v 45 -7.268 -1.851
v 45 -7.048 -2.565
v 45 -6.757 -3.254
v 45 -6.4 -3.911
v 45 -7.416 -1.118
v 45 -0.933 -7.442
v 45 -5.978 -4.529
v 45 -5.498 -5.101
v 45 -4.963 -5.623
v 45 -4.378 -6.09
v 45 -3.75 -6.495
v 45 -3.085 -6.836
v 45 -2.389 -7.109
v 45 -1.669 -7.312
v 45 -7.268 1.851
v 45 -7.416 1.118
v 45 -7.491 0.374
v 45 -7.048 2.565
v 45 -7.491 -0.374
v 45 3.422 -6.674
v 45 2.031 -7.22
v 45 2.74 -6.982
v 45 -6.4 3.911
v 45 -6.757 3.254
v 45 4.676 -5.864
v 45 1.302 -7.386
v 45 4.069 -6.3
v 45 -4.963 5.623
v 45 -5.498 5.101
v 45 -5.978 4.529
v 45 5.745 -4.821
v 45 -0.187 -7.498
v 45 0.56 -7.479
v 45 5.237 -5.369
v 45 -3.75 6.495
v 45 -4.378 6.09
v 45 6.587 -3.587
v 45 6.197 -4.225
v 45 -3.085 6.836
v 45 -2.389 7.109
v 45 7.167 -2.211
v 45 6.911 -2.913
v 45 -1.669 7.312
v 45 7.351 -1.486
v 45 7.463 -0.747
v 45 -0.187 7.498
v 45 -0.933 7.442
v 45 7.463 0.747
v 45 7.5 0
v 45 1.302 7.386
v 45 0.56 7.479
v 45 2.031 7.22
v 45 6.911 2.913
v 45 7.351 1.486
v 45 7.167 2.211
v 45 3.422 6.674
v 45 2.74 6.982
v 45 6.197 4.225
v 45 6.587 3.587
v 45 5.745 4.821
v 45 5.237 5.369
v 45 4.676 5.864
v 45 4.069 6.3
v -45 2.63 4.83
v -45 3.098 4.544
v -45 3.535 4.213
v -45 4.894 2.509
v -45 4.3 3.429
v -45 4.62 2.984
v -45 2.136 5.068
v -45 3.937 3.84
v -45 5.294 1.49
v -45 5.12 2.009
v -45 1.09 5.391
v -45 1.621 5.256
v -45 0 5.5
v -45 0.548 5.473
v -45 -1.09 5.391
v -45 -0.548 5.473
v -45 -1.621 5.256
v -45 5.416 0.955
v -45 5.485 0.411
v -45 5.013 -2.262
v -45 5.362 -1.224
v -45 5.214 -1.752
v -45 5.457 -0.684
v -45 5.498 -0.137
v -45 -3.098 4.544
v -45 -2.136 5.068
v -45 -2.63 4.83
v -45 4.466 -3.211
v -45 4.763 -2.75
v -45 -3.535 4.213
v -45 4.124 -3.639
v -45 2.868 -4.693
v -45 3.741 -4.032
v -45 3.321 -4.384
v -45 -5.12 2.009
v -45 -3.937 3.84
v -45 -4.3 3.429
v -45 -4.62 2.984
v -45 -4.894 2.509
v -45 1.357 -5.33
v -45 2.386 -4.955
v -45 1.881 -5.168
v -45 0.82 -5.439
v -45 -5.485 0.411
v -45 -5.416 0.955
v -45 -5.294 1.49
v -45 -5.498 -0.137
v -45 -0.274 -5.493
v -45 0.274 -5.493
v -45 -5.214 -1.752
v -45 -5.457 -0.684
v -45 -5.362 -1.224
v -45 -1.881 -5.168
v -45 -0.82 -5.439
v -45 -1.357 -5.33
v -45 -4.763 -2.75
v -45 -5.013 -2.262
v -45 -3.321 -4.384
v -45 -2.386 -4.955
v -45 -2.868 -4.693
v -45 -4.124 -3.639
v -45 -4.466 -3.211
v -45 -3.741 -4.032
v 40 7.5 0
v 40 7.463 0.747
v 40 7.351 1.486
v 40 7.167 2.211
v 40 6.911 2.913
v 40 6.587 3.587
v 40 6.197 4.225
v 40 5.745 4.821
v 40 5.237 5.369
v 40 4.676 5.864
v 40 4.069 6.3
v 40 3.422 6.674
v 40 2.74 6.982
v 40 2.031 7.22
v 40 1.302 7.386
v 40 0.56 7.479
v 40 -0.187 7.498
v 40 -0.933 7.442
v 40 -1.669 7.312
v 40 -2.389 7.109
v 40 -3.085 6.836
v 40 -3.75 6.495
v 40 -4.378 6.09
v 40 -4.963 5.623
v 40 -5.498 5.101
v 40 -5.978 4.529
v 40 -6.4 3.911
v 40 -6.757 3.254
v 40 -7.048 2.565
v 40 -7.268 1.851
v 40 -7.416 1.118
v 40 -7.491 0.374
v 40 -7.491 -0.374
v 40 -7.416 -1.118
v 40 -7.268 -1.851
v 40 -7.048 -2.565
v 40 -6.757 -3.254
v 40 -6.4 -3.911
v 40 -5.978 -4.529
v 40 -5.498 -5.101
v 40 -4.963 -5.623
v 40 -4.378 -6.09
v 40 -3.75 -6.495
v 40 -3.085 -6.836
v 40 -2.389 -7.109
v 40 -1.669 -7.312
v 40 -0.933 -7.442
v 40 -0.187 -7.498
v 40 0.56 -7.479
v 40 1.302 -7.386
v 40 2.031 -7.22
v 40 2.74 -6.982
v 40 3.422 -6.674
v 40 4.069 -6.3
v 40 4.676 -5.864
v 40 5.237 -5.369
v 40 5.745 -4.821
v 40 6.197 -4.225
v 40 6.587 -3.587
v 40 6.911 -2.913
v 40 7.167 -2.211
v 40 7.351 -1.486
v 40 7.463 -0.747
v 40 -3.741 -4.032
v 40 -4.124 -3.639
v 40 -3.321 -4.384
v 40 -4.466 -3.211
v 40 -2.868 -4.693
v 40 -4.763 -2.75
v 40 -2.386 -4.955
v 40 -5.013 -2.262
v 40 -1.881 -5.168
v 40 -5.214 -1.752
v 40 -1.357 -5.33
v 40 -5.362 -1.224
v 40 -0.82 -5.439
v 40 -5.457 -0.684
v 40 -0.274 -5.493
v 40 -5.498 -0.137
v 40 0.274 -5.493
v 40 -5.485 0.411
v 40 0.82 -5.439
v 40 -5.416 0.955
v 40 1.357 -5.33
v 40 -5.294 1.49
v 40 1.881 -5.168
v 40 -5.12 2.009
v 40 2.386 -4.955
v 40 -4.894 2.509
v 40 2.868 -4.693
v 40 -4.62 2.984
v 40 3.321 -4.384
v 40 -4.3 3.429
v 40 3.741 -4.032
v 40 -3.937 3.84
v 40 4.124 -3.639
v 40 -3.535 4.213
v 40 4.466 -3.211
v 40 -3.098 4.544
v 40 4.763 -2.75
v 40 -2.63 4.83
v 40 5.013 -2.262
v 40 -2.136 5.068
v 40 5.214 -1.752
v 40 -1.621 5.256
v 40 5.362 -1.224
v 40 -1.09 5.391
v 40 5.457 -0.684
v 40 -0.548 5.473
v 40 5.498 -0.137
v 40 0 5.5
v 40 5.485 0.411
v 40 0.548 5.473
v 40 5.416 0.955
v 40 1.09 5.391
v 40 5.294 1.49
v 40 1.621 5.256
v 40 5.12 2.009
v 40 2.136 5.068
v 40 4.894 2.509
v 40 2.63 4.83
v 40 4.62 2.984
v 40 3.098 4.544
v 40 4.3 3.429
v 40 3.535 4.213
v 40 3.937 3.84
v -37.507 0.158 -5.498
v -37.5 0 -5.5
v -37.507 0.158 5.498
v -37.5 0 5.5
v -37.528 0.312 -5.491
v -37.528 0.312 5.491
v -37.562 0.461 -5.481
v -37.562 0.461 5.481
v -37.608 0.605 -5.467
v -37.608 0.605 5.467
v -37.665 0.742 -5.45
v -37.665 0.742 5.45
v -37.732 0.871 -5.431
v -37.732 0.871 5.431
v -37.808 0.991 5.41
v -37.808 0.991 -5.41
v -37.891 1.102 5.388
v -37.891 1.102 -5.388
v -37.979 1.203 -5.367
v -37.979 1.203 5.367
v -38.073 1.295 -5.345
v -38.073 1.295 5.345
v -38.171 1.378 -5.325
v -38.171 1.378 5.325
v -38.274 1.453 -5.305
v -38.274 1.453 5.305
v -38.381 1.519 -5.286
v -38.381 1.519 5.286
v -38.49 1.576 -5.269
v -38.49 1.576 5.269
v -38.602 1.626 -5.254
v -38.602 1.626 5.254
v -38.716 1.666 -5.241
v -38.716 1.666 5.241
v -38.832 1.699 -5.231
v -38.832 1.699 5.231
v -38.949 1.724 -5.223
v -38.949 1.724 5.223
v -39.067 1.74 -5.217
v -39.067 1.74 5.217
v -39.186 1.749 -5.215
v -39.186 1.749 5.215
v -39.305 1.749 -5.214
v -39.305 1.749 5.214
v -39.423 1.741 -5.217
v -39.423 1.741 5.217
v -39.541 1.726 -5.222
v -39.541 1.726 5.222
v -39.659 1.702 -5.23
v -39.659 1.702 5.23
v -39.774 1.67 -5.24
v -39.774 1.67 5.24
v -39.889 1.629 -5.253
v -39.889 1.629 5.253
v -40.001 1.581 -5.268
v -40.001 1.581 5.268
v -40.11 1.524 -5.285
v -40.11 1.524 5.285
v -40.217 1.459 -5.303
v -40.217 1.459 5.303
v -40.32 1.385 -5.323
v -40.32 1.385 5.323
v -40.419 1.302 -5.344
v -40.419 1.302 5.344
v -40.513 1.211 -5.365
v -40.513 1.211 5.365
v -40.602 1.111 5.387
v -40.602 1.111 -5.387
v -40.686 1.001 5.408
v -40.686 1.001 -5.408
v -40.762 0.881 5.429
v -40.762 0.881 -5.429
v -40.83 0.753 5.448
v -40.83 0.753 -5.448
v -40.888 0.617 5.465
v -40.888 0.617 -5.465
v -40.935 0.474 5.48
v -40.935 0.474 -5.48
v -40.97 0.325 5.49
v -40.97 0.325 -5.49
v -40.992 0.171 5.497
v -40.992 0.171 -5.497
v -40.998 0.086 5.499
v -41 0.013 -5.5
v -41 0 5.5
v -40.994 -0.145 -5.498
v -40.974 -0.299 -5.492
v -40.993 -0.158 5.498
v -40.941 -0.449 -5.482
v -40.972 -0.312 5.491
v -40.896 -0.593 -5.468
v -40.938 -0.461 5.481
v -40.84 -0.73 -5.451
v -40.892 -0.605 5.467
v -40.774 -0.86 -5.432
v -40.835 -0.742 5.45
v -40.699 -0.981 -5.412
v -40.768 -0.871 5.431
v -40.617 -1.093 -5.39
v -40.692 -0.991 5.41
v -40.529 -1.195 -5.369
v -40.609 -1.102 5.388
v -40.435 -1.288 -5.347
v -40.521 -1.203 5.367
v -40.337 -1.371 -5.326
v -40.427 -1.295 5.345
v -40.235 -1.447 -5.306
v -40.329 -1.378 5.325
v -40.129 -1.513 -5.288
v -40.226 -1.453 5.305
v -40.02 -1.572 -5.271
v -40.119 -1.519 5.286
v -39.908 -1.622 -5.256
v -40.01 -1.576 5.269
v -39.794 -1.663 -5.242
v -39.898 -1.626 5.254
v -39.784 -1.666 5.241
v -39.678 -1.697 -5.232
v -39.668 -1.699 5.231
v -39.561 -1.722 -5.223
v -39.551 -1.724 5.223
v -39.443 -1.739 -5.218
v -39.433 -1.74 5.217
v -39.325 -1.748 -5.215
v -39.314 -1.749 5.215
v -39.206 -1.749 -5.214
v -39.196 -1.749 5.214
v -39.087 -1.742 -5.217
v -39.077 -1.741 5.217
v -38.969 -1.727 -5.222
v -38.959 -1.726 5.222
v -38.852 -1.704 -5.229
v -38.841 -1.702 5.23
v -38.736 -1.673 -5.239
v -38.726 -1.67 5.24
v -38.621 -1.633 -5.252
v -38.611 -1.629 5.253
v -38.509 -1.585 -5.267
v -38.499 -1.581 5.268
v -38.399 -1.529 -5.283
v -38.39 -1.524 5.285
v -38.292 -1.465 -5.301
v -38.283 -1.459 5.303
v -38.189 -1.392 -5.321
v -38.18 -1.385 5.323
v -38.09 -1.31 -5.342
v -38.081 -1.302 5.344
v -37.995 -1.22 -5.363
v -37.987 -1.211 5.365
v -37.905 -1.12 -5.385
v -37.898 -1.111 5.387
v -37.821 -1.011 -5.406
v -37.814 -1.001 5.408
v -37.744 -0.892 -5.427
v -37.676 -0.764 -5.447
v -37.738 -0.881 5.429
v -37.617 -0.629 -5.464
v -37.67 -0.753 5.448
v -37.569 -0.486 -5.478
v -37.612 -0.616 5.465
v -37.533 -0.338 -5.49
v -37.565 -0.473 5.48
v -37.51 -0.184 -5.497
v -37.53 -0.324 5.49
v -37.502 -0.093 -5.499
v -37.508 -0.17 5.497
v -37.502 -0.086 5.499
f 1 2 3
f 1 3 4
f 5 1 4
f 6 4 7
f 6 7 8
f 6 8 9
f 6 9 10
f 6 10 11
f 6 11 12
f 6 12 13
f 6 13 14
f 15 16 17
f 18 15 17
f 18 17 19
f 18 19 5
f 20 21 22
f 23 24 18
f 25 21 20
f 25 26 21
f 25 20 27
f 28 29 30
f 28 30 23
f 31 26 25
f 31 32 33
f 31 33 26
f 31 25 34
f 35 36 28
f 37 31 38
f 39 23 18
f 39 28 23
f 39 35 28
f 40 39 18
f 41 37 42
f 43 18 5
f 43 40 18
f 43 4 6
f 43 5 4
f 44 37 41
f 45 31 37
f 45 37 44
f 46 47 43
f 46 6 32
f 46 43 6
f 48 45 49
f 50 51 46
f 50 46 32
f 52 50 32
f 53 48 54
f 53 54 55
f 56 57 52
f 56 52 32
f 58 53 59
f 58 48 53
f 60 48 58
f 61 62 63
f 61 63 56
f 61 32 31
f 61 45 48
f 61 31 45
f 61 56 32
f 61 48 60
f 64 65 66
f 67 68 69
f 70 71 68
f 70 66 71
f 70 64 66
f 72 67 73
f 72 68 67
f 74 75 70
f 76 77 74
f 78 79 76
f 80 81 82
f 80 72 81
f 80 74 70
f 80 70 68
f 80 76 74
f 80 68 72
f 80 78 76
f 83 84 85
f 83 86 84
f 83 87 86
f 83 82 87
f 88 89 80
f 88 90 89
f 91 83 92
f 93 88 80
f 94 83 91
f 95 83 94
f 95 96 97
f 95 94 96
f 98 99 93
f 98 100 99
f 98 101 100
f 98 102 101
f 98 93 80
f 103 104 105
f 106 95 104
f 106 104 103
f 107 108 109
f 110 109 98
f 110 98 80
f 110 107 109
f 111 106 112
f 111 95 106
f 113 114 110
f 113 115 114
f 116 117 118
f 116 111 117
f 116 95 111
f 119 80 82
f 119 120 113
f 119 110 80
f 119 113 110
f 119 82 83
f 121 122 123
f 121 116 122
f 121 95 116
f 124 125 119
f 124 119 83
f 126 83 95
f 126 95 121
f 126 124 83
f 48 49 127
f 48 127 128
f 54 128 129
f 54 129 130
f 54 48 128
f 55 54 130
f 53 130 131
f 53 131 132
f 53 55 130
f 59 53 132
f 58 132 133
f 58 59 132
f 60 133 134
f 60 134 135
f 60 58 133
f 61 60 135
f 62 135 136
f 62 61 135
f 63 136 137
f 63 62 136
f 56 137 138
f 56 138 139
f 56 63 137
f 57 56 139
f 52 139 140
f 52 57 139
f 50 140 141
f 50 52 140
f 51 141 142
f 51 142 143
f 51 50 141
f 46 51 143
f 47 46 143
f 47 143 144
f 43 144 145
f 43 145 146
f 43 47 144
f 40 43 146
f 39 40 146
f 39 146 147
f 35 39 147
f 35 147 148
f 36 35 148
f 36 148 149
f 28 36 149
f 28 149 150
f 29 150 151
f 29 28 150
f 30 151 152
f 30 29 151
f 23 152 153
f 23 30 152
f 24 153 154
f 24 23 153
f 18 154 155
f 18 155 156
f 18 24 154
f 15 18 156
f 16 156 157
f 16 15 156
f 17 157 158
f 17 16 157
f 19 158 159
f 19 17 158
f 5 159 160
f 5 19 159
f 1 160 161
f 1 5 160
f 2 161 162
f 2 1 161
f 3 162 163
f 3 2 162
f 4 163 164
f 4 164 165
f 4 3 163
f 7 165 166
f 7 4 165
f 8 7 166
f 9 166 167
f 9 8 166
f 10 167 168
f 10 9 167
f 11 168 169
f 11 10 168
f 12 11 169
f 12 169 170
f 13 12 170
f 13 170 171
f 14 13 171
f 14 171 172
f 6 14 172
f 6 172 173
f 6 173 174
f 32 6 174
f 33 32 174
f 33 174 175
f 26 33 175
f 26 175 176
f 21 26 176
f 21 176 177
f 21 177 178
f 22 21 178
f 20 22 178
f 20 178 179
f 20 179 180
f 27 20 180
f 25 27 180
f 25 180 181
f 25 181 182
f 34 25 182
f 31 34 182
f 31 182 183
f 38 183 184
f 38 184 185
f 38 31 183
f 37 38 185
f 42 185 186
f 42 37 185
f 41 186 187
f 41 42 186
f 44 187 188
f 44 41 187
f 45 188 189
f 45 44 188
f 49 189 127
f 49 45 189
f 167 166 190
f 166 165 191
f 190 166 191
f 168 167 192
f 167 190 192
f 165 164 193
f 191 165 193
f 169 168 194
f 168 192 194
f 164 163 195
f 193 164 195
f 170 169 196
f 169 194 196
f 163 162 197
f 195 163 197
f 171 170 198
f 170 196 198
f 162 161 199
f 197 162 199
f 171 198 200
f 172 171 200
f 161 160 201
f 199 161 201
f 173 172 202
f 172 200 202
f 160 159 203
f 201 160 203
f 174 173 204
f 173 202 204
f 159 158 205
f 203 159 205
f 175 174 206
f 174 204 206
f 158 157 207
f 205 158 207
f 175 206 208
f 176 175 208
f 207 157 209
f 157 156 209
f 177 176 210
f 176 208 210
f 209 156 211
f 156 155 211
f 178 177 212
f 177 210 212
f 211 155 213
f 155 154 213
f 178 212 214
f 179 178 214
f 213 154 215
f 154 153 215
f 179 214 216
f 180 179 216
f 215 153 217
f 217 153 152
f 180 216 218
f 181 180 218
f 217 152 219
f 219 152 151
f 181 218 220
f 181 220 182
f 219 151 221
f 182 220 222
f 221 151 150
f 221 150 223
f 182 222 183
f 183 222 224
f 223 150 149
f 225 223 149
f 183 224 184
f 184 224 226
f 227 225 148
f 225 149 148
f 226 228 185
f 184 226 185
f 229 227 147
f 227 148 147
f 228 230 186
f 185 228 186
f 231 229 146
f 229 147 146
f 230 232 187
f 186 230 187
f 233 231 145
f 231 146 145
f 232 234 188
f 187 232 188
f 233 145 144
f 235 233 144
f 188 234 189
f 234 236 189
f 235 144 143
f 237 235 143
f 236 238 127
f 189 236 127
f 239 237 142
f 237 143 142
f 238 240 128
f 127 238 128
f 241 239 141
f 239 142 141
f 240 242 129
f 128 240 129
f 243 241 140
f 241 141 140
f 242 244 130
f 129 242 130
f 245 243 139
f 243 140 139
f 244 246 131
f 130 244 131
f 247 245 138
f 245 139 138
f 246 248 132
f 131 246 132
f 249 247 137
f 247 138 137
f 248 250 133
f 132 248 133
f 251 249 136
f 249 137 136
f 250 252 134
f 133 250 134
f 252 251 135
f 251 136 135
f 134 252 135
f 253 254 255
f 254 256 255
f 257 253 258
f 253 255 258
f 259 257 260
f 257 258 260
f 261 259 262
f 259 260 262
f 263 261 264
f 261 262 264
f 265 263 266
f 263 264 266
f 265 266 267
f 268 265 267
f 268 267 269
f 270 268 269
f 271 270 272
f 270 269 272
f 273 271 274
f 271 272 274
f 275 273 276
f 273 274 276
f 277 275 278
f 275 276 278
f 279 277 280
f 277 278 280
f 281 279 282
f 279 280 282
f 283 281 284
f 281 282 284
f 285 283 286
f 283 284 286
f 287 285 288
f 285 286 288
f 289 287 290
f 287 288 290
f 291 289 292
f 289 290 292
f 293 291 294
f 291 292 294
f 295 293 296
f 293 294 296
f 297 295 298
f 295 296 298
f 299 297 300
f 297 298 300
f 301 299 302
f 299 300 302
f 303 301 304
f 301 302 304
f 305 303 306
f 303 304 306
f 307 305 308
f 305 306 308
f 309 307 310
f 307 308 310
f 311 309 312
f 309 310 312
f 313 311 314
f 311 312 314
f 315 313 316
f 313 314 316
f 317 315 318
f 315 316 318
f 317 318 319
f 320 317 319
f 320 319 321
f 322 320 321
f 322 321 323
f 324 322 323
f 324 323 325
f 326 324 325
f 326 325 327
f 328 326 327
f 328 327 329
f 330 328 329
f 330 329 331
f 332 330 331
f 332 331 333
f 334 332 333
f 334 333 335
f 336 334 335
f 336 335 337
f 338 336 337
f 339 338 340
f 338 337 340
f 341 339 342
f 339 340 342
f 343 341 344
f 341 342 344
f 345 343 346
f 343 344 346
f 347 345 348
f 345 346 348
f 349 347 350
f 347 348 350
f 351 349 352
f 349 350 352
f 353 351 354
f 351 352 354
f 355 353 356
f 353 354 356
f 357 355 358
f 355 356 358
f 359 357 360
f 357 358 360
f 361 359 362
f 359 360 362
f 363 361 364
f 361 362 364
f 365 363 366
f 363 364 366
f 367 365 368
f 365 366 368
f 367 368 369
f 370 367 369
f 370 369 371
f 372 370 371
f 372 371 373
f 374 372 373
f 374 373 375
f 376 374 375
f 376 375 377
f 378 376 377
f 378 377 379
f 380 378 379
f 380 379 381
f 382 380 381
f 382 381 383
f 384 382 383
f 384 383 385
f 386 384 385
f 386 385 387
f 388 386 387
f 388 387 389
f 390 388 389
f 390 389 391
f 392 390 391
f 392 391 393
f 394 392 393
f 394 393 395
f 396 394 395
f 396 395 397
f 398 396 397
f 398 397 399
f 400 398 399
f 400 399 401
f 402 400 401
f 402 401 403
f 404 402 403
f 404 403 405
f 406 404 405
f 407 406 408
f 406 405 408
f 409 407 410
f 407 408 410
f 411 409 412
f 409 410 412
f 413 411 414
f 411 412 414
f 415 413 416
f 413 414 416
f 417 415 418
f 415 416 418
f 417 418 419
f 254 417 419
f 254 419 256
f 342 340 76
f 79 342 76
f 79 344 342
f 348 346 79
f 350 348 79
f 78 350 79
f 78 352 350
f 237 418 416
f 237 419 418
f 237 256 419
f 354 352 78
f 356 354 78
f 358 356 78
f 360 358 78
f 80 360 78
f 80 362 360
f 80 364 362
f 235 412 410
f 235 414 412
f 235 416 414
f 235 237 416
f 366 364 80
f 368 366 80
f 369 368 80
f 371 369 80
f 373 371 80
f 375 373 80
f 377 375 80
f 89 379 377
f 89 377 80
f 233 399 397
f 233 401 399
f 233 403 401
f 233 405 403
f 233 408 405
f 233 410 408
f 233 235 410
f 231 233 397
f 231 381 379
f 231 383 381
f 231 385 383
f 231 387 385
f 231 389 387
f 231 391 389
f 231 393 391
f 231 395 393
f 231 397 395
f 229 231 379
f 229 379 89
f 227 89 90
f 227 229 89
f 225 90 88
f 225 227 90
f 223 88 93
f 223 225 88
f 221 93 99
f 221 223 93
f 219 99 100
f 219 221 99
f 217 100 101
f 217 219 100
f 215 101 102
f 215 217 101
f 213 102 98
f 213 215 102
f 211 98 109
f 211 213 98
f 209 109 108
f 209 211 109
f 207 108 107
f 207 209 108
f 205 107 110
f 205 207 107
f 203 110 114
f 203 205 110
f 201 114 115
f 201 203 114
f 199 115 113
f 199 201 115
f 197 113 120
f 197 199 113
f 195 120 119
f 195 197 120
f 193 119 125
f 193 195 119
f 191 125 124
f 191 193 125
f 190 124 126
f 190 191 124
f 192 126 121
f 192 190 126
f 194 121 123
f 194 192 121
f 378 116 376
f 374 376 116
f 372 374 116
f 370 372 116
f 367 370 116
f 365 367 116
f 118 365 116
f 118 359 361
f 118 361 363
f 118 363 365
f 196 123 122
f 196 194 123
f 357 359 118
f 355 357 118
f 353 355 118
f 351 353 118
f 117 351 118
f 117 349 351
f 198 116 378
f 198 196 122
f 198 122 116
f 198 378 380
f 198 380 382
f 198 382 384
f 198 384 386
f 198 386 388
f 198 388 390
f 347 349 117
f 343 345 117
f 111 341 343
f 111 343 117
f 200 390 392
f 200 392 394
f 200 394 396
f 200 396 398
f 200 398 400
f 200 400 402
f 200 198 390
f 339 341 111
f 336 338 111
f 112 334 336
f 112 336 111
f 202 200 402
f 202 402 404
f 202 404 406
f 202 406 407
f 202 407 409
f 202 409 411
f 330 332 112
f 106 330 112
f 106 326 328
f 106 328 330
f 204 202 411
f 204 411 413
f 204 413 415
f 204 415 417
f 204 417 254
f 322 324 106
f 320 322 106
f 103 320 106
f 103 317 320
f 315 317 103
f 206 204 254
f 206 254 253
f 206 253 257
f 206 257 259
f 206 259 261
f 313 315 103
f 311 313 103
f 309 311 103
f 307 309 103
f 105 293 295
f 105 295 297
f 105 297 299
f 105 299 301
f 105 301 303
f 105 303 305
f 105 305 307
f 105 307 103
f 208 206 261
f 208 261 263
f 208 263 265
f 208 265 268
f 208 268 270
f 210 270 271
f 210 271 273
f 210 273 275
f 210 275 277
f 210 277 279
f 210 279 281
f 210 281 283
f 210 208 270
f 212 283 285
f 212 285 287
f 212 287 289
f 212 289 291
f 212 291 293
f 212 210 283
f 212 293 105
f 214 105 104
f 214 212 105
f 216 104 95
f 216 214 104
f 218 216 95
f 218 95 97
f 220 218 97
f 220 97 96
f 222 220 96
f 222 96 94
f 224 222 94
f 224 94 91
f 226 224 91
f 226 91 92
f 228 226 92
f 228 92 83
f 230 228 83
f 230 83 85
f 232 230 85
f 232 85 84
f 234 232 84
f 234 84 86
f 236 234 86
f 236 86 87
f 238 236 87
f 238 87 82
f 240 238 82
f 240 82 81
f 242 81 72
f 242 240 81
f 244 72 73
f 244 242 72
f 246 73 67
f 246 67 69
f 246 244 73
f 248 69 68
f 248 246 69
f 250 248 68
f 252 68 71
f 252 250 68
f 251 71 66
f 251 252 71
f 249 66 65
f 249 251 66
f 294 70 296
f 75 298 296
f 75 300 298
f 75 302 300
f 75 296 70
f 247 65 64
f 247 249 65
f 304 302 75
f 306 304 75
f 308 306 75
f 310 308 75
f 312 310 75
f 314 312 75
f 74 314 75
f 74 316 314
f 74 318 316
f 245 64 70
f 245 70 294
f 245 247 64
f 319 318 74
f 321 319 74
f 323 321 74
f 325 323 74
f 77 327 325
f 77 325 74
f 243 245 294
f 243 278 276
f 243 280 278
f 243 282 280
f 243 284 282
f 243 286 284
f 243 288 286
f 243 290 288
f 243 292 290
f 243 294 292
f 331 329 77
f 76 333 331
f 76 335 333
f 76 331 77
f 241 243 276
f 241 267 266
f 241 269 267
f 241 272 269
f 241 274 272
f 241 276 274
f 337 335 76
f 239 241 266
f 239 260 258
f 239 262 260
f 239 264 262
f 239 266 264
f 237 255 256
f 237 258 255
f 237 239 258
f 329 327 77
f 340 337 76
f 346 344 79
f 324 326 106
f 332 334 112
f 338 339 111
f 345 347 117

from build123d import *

# Parameters (mm, degrees)
F0_W     = 90
F0_H     = 5.5
F2_R     = 1.75
F3_DEPTH = 15
F4_R     = 7.5
F4_R_2   = 5.5
F5_DEPTH = 5


with BuildPart() as f1:
    # F0 (on Front) → F1 (revolve)
    with BuildSketch(Plane.XZ):
        with Locations((0, 2.75)):
            Rectangle(F0_W, F0_H)
    revolve(axis=Axis((0, 0, 0), (1, 0, 0)))

    # F2 (on Top) → F3 (cut, symmetric)
    with BuildSketch(Plane.XY):
        with Locations((-39.25, 0)):
            Circle(F2_R)
    extrude(amount=F3_DEPTH, both=True, mode=Mode.SUBTRACT)

    # F4 (on face) → F5 (join)
    with BuildSketch(Plane.YZ.offset(45)):
        Circle(F4_R)
        Circle(F4_R_2, mode=Mode.SUBTRACT)
    extrude(amount=-F5_DEPTH)


solid = f1.part
